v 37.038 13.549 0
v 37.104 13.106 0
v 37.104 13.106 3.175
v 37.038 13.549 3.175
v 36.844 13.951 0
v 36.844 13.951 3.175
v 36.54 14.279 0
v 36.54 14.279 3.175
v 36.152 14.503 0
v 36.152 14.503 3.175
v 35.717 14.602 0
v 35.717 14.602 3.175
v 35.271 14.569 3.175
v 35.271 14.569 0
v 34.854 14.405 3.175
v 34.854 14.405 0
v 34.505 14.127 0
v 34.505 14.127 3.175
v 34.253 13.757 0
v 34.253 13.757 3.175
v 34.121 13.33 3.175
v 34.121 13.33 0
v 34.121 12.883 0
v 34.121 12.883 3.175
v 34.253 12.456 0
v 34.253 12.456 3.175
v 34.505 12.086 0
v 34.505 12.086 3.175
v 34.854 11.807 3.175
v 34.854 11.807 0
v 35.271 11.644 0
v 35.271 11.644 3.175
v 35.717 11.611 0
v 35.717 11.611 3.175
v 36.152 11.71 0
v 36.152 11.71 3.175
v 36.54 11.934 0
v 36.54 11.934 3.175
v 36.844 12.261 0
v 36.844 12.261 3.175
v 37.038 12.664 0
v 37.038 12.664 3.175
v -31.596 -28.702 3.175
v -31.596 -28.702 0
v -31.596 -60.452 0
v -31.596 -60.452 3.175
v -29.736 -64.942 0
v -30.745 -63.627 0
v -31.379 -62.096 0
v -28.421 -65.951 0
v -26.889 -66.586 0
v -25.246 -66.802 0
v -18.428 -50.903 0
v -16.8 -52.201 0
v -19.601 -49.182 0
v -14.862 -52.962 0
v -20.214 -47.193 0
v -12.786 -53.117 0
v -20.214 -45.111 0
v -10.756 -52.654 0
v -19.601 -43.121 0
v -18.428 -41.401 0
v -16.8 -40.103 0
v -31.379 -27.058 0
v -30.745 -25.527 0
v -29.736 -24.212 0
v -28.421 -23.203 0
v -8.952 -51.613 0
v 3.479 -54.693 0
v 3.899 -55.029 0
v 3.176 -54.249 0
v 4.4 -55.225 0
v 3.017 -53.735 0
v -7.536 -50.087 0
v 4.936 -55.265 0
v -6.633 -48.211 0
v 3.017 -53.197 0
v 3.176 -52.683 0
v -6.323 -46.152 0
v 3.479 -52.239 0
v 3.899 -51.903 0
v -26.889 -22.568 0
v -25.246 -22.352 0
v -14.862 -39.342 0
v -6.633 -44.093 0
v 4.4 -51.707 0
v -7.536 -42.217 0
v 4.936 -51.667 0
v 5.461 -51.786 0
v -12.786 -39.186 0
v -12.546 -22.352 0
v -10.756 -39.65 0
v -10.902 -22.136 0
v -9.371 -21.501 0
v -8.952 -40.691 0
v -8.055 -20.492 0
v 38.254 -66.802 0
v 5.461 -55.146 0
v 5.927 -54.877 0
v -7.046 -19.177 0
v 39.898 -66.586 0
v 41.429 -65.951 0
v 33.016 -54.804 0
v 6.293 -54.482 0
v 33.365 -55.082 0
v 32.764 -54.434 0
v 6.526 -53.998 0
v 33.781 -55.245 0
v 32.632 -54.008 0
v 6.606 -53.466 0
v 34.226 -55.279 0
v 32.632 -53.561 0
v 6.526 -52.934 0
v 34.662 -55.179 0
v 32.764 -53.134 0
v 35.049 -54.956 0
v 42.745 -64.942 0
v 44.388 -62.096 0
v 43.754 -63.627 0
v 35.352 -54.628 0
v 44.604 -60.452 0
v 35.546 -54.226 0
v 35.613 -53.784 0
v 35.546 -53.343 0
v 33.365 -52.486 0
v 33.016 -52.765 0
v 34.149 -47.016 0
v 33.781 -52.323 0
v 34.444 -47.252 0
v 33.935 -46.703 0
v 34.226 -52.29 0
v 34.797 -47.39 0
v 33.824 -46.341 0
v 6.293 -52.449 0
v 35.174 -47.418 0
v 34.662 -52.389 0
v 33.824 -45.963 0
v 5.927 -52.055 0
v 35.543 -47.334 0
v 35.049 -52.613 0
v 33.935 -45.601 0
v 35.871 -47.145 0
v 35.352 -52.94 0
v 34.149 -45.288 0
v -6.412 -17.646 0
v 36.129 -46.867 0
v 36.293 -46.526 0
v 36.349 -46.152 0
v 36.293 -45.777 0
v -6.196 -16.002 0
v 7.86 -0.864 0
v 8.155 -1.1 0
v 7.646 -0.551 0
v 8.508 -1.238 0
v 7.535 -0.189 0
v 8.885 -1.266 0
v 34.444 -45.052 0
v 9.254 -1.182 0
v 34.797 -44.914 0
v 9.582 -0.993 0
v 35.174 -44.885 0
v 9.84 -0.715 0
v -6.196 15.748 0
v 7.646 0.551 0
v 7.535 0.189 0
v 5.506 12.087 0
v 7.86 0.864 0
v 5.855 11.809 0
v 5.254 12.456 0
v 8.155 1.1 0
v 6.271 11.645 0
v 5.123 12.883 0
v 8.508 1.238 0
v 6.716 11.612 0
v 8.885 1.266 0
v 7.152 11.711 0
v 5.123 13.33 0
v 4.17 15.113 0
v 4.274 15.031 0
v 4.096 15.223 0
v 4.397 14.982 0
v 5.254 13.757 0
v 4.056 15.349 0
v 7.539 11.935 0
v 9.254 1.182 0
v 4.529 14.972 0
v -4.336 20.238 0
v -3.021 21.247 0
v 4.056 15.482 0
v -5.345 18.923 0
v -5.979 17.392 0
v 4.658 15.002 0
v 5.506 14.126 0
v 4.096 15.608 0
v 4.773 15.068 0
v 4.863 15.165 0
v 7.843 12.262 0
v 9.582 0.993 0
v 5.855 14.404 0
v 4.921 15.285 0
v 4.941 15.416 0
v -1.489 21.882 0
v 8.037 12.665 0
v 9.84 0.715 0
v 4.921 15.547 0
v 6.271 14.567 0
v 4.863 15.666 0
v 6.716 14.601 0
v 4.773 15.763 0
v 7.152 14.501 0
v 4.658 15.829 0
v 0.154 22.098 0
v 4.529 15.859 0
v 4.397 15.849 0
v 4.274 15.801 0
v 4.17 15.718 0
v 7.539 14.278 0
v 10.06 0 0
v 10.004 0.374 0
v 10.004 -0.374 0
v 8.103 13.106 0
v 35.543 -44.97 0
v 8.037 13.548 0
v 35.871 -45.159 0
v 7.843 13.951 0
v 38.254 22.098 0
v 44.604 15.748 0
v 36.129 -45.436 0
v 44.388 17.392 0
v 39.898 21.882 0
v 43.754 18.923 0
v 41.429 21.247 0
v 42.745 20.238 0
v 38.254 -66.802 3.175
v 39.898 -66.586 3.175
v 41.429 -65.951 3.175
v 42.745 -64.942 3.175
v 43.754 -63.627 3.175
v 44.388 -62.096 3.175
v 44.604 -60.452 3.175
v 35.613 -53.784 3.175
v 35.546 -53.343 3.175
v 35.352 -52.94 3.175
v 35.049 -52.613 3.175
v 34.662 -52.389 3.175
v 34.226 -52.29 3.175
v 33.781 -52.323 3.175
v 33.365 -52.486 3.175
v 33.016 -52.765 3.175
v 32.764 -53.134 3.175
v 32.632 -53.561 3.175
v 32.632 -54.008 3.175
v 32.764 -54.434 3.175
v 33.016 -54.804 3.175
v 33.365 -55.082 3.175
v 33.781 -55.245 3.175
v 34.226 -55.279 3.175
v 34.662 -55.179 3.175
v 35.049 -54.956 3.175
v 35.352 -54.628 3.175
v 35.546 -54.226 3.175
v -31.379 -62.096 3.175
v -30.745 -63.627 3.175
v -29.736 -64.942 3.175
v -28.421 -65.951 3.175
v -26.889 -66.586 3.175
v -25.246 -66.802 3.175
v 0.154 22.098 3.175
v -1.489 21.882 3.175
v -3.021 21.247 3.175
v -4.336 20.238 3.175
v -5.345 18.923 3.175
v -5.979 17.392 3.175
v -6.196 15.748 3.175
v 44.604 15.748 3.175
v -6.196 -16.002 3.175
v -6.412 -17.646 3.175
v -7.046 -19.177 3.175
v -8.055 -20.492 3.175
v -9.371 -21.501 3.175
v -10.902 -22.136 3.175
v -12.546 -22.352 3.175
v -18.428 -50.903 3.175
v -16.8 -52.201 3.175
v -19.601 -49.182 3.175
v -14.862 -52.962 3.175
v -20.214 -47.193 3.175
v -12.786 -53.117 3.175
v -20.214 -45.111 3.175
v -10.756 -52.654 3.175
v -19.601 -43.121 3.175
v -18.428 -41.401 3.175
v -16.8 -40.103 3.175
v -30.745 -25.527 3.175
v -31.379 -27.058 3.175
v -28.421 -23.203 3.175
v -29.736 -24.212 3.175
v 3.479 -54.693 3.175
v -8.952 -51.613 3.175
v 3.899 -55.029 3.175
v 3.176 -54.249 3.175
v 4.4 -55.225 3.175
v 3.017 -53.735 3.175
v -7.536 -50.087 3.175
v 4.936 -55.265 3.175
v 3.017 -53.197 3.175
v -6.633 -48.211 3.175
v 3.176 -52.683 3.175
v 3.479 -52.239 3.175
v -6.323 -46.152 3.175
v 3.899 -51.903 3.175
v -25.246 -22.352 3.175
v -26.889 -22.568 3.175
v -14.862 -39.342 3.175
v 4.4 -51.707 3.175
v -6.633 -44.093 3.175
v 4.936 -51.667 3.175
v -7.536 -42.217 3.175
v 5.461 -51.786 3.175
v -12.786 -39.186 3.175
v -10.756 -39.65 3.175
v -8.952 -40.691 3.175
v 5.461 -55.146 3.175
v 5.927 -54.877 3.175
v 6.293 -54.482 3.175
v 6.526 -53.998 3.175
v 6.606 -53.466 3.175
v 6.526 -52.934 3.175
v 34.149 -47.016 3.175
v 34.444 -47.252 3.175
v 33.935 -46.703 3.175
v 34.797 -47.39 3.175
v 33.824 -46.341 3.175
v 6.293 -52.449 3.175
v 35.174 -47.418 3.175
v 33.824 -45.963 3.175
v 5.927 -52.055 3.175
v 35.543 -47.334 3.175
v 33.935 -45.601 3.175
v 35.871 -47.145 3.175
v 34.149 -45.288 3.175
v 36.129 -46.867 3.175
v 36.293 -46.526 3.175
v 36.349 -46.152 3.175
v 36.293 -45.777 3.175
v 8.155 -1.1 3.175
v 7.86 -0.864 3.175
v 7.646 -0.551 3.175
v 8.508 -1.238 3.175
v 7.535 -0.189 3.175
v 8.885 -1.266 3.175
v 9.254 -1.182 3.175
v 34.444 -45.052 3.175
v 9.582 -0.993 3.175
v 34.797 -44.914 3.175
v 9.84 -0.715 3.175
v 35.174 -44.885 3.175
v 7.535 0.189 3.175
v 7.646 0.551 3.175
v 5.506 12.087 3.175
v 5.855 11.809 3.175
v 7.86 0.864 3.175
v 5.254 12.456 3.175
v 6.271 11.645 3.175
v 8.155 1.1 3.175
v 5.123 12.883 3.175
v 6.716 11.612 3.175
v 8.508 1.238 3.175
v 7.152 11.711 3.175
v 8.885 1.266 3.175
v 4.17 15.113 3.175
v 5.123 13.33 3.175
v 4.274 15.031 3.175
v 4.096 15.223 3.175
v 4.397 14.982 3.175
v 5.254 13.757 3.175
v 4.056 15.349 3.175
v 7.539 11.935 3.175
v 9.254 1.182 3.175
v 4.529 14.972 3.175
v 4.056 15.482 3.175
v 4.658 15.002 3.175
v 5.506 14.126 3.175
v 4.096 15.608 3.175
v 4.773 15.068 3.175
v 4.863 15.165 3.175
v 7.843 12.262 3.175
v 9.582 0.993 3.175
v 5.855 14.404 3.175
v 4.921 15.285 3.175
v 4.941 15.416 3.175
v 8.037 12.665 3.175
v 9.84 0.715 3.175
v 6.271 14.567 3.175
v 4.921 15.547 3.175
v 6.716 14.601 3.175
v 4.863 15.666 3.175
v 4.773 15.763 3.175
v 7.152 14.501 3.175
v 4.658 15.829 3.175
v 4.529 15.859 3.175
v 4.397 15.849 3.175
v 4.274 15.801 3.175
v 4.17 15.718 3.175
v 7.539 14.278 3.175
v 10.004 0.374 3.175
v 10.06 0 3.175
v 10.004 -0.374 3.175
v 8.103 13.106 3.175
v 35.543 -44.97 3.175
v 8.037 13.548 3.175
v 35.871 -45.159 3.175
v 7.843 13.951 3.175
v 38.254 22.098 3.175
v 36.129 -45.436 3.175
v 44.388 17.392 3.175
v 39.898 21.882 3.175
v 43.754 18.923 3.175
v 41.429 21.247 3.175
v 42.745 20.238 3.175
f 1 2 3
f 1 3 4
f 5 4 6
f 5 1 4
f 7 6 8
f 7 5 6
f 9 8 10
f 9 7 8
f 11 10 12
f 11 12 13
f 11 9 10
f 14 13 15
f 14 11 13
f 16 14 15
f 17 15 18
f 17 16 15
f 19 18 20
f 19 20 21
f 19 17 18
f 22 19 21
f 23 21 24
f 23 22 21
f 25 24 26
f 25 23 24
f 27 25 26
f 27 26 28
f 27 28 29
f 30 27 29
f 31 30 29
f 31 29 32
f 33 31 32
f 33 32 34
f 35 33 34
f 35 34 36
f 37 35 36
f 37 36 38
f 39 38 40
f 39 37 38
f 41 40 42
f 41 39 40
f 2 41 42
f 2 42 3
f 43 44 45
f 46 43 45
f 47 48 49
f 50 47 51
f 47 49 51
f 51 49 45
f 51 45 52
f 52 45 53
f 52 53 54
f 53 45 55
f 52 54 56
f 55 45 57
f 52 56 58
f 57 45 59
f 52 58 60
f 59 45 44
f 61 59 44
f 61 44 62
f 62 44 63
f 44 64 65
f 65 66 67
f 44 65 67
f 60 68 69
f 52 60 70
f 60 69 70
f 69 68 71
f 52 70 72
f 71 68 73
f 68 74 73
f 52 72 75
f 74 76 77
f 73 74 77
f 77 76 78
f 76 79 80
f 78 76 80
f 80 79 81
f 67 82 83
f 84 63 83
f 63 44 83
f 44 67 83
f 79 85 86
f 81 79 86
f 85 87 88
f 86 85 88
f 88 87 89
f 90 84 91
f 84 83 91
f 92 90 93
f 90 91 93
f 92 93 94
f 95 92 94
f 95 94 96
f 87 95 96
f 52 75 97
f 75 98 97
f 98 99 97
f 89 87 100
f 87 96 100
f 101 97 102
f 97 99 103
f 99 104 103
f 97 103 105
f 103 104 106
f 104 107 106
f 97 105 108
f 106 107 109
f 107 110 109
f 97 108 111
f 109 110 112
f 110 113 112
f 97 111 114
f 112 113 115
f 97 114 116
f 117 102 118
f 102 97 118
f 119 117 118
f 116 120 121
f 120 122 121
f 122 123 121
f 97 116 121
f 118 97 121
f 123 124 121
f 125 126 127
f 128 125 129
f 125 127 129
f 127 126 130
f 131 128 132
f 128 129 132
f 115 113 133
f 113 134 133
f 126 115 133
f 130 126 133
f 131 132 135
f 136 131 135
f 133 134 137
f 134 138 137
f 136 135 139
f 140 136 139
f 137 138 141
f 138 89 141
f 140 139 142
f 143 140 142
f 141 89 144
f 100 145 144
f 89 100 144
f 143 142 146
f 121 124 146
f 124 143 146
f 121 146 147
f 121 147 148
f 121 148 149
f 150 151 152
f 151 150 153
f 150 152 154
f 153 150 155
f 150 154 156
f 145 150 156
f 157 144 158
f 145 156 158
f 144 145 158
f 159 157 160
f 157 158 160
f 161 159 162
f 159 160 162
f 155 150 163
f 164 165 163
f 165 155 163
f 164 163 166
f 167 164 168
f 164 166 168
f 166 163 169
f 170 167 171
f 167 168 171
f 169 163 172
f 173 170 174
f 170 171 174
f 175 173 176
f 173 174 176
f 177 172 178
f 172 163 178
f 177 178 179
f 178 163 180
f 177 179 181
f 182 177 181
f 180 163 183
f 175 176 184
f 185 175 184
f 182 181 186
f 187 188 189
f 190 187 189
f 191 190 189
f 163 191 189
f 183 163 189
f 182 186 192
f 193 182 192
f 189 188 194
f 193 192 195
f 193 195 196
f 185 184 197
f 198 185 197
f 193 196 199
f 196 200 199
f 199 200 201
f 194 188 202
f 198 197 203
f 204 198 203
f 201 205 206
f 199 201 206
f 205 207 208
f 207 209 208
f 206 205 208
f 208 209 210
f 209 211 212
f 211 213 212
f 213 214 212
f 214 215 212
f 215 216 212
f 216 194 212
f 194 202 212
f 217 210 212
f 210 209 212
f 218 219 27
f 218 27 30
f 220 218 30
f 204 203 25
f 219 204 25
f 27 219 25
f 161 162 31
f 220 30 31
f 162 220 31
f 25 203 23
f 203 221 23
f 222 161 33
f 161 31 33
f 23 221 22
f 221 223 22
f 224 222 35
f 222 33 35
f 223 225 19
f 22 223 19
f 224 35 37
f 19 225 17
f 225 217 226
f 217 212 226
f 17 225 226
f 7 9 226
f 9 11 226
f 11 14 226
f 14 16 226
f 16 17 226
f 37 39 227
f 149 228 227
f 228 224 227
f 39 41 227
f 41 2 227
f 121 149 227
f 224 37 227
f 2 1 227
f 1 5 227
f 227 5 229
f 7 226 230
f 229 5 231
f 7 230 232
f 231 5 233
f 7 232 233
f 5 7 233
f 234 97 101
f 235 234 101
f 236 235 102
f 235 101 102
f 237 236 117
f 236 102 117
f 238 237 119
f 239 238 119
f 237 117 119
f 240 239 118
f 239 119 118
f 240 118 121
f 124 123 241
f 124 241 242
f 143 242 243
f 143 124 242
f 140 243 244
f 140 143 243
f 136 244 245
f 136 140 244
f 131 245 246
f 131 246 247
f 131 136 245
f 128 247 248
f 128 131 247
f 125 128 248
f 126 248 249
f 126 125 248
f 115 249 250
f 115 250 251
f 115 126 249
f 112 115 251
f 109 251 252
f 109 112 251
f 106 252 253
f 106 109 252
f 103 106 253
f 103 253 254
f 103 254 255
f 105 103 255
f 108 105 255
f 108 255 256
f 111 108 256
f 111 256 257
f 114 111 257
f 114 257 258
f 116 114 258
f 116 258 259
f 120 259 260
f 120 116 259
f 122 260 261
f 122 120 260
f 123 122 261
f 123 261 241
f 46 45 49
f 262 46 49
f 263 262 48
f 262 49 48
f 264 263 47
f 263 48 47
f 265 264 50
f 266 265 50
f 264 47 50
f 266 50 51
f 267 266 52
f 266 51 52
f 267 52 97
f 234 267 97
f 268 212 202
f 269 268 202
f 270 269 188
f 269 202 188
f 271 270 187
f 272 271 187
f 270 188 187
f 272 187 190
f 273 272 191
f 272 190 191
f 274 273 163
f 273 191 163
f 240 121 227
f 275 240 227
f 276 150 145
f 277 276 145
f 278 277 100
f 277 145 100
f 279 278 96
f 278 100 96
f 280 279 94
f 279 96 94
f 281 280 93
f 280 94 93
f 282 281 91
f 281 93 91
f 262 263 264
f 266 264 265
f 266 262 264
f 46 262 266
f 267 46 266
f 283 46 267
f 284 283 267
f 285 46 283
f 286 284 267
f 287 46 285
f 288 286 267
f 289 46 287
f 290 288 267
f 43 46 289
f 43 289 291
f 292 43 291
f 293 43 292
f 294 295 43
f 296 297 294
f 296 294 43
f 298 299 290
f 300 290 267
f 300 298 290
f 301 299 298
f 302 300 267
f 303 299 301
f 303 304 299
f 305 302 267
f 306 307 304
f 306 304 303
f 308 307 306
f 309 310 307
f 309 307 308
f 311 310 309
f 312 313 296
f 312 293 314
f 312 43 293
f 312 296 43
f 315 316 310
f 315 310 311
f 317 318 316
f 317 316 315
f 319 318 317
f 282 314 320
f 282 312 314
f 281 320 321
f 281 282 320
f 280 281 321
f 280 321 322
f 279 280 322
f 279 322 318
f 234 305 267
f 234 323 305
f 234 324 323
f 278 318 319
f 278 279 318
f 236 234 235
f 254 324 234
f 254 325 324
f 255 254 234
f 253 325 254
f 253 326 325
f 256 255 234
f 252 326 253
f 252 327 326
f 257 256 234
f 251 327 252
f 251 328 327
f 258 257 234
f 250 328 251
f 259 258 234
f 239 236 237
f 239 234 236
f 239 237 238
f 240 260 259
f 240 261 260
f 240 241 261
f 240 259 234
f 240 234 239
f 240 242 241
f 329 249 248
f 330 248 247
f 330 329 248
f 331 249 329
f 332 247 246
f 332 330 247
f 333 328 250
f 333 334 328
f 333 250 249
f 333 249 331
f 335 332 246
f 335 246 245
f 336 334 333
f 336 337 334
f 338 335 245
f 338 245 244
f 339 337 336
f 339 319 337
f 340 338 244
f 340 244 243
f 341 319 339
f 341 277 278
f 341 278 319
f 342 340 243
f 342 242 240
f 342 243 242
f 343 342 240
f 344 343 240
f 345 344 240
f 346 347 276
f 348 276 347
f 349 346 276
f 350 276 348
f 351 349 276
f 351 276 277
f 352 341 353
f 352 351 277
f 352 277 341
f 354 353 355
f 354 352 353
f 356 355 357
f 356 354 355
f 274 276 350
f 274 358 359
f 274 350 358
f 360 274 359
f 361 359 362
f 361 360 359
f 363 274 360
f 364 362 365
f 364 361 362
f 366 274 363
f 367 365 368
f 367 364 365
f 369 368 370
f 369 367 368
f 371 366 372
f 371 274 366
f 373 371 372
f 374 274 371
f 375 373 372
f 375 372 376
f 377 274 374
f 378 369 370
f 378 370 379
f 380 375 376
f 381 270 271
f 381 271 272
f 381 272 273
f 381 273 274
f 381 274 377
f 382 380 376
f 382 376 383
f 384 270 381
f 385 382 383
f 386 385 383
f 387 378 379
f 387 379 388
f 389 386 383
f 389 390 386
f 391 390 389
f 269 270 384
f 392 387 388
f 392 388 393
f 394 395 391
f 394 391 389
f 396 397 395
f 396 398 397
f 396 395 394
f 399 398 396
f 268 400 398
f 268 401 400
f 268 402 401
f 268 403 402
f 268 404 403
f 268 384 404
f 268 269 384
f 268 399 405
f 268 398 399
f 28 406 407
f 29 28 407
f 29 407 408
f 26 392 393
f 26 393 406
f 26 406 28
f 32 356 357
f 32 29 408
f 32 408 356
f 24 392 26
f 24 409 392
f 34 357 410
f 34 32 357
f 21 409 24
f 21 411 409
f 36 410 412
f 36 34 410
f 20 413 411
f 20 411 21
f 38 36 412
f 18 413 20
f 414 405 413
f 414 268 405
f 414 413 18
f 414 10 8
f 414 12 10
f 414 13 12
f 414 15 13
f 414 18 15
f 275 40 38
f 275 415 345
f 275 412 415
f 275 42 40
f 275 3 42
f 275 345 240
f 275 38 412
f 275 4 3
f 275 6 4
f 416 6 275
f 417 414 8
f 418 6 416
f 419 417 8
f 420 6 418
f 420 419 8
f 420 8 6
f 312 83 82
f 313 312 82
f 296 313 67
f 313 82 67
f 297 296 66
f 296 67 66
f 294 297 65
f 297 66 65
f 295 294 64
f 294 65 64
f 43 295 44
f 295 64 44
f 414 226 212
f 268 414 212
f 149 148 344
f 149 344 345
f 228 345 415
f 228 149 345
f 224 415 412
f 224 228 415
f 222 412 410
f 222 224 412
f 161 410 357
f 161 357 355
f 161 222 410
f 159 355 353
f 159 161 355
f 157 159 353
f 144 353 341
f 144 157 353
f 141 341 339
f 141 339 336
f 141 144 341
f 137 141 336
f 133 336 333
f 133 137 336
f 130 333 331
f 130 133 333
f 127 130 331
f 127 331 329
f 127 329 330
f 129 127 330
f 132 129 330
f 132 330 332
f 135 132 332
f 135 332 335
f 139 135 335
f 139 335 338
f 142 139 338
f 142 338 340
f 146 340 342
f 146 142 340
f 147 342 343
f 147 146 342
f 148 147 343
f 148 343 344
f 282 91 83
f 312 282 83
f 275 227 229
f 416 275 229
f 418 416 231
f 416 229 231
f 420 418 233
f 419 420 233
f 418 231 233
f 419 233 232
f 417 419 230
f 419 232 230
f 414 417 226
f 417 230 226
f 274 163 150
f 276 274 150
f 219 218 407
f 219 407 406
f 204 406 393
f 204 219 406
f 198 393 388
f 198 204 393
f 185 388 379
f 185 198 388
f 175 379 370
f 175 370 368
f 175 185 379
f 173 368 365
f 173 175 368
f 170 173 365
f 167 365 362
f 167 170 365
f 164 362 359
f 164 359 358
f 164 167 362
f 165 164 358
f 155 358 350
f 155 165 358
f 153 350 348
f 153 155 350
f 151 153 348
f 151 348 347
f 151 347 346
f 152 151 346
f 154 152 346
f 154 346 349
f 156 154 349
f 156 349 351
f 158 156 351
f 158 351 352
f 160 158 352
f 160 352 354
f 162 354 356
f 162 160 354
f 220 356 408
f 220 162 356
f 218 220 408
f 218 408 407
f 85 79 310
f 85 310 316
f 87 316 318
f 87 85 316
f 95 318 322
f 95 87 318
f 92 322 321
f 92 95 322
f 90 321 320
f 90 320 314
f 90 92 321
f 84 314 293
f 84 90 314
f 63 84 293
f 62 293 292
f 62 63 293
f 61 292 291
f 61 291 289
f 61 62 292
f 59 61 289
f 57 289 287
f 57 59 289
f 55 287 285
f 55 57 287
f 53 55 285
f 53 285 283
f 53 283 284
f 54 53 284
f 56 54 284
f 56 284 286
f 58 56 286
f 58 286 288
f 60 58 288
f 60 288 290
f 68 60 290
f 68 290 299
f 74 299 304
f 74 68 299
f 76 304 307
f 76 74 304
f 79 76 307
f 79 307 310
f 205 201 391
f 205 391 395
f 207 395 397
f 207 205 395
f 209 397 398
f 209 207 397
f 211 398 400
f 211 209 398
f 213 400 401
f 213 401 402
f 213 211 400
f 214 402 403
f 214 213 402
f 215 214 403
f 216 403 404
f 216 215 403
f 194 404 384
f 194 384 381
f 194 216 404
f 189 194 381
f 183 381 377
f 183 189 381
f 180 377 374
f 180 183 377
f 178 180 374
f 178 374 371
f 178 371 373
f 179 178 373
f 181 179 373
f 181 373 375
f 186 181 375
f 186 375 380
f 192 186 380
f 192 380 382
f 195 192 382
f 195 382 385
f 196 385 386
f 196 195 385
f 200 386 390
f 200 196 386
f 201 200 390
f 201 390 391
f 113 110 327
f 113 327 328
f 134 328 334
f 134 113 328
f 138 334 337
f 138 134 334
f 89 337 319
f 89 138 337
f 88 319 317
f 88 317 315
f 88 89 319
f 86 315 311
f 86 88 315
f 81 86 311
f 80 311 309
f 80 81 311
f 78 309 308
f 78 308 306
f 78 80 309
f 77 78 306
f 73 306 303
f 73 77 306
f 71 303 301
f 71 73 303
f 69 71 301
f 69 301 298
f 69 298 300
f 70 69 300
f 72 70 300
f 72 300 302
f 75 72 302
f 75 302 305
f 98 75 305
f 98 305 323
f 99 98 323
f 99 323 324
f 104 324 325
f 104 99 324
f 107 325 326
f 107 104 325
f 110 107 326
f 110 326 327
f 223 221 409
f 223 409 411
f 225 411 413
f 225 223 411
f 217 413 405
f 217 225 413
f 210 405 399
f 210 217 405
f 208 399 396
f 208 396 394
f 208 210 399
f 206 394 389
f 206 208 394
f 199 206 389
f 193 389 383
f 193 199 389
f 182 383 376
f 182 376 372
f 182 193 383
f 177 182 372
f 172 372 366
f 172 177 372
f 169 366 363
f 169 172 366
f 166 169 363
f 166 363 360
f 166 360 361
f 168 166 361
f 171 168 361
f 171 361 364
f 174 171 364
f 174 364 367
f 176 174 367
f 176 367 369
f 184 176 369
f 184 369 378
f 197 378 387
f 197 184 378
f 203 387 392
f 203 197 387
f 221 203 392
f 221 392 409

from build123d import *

# Parameters (mm, degrees)
F0_R     = 6.985
F0_R_2   = 1.804442
F0_R_3   = 1.4986
F0_R_4   = 1.27
F0_R_5   = 0.4445
F0_R_6   = 1.5
F1_DEPTH = 3.175


with BuildPart() as f1:
    # F0 (on Top) → F1 (new body)
    with BuildSketch(Plane.XY):
        with BuildLine():
            ThreePointArc((-31.595516, -60.452), (-29.735644, -64.942128), (-25.245516, -66.802))
            Line((-25.245516, -66.802), (38.254484, -66.802))
            ThreePointArc((38.254484, -66.802), (42.744612, -64.942128), (44.604484, -60.452))
            Line((44.604484, -60.452), (44.604484, 15.748))
            ThreePointArc((44.604484, 15.748), (42.744612, 20.238128), (38.254484, 22.098))
            Line((38.254484, 22.098), (0.154484, 22.098))
            ThreePointArc((0.154484, 22.098), (-4.335644, 20.238128), (-6.195516, 15.748))
            Line((-6.195516, 15.748), (-6.195516, -16.002))
            ThreePointArc((-6.195516, -16.002), (-8.055388, -20.492128), (-12.545516, -22.352))
            Line((-12.545516, -22.352), (-25.245516, -22.352))
            ThreePointArc((-25.245516, -22.352), (-29.735644, -24.211872), (-31.595516, -28.702))
            Line((-31.595516, -28.702), (-31.595516, -60.452))
        make_face()
        with Locations((-13.307516, -46.1518)):
            Circle(F0_R, mode=Mode.SUBTRACT)
        with Locations((4.801642, -53.465958)):
            Circle(F0_R_2, mode=Mode.SUBTRACT)
        with Locations((34.114284, -53.784222)):
            Circle(F0_R_3, mode=Mode.SUBTRACT)
        with Locations((35.079484, -46.1518)):
            Circle(F0_R_4, mode=Mode.SUBTRACT)
        with Locations((4.496019, 15.415596)):
            Circle(F0_R_5, mode=Mode.SUBTRACT)
        with Locations((8.790484, 0)):
            Circle(F0_R_4, mode=Mode.SUBTRACT)
        with Locations((6.604484, 13.1064)):
            Circle(F0_R_3, mode=Mode.SUBTRACT)
        with Locations((35.604484, 13.1064)):
            Circle(F0_R_6, mode=Mode.SUBTRACT)
    extrude(amount=F1_DEPTH)


solid = f1.part
